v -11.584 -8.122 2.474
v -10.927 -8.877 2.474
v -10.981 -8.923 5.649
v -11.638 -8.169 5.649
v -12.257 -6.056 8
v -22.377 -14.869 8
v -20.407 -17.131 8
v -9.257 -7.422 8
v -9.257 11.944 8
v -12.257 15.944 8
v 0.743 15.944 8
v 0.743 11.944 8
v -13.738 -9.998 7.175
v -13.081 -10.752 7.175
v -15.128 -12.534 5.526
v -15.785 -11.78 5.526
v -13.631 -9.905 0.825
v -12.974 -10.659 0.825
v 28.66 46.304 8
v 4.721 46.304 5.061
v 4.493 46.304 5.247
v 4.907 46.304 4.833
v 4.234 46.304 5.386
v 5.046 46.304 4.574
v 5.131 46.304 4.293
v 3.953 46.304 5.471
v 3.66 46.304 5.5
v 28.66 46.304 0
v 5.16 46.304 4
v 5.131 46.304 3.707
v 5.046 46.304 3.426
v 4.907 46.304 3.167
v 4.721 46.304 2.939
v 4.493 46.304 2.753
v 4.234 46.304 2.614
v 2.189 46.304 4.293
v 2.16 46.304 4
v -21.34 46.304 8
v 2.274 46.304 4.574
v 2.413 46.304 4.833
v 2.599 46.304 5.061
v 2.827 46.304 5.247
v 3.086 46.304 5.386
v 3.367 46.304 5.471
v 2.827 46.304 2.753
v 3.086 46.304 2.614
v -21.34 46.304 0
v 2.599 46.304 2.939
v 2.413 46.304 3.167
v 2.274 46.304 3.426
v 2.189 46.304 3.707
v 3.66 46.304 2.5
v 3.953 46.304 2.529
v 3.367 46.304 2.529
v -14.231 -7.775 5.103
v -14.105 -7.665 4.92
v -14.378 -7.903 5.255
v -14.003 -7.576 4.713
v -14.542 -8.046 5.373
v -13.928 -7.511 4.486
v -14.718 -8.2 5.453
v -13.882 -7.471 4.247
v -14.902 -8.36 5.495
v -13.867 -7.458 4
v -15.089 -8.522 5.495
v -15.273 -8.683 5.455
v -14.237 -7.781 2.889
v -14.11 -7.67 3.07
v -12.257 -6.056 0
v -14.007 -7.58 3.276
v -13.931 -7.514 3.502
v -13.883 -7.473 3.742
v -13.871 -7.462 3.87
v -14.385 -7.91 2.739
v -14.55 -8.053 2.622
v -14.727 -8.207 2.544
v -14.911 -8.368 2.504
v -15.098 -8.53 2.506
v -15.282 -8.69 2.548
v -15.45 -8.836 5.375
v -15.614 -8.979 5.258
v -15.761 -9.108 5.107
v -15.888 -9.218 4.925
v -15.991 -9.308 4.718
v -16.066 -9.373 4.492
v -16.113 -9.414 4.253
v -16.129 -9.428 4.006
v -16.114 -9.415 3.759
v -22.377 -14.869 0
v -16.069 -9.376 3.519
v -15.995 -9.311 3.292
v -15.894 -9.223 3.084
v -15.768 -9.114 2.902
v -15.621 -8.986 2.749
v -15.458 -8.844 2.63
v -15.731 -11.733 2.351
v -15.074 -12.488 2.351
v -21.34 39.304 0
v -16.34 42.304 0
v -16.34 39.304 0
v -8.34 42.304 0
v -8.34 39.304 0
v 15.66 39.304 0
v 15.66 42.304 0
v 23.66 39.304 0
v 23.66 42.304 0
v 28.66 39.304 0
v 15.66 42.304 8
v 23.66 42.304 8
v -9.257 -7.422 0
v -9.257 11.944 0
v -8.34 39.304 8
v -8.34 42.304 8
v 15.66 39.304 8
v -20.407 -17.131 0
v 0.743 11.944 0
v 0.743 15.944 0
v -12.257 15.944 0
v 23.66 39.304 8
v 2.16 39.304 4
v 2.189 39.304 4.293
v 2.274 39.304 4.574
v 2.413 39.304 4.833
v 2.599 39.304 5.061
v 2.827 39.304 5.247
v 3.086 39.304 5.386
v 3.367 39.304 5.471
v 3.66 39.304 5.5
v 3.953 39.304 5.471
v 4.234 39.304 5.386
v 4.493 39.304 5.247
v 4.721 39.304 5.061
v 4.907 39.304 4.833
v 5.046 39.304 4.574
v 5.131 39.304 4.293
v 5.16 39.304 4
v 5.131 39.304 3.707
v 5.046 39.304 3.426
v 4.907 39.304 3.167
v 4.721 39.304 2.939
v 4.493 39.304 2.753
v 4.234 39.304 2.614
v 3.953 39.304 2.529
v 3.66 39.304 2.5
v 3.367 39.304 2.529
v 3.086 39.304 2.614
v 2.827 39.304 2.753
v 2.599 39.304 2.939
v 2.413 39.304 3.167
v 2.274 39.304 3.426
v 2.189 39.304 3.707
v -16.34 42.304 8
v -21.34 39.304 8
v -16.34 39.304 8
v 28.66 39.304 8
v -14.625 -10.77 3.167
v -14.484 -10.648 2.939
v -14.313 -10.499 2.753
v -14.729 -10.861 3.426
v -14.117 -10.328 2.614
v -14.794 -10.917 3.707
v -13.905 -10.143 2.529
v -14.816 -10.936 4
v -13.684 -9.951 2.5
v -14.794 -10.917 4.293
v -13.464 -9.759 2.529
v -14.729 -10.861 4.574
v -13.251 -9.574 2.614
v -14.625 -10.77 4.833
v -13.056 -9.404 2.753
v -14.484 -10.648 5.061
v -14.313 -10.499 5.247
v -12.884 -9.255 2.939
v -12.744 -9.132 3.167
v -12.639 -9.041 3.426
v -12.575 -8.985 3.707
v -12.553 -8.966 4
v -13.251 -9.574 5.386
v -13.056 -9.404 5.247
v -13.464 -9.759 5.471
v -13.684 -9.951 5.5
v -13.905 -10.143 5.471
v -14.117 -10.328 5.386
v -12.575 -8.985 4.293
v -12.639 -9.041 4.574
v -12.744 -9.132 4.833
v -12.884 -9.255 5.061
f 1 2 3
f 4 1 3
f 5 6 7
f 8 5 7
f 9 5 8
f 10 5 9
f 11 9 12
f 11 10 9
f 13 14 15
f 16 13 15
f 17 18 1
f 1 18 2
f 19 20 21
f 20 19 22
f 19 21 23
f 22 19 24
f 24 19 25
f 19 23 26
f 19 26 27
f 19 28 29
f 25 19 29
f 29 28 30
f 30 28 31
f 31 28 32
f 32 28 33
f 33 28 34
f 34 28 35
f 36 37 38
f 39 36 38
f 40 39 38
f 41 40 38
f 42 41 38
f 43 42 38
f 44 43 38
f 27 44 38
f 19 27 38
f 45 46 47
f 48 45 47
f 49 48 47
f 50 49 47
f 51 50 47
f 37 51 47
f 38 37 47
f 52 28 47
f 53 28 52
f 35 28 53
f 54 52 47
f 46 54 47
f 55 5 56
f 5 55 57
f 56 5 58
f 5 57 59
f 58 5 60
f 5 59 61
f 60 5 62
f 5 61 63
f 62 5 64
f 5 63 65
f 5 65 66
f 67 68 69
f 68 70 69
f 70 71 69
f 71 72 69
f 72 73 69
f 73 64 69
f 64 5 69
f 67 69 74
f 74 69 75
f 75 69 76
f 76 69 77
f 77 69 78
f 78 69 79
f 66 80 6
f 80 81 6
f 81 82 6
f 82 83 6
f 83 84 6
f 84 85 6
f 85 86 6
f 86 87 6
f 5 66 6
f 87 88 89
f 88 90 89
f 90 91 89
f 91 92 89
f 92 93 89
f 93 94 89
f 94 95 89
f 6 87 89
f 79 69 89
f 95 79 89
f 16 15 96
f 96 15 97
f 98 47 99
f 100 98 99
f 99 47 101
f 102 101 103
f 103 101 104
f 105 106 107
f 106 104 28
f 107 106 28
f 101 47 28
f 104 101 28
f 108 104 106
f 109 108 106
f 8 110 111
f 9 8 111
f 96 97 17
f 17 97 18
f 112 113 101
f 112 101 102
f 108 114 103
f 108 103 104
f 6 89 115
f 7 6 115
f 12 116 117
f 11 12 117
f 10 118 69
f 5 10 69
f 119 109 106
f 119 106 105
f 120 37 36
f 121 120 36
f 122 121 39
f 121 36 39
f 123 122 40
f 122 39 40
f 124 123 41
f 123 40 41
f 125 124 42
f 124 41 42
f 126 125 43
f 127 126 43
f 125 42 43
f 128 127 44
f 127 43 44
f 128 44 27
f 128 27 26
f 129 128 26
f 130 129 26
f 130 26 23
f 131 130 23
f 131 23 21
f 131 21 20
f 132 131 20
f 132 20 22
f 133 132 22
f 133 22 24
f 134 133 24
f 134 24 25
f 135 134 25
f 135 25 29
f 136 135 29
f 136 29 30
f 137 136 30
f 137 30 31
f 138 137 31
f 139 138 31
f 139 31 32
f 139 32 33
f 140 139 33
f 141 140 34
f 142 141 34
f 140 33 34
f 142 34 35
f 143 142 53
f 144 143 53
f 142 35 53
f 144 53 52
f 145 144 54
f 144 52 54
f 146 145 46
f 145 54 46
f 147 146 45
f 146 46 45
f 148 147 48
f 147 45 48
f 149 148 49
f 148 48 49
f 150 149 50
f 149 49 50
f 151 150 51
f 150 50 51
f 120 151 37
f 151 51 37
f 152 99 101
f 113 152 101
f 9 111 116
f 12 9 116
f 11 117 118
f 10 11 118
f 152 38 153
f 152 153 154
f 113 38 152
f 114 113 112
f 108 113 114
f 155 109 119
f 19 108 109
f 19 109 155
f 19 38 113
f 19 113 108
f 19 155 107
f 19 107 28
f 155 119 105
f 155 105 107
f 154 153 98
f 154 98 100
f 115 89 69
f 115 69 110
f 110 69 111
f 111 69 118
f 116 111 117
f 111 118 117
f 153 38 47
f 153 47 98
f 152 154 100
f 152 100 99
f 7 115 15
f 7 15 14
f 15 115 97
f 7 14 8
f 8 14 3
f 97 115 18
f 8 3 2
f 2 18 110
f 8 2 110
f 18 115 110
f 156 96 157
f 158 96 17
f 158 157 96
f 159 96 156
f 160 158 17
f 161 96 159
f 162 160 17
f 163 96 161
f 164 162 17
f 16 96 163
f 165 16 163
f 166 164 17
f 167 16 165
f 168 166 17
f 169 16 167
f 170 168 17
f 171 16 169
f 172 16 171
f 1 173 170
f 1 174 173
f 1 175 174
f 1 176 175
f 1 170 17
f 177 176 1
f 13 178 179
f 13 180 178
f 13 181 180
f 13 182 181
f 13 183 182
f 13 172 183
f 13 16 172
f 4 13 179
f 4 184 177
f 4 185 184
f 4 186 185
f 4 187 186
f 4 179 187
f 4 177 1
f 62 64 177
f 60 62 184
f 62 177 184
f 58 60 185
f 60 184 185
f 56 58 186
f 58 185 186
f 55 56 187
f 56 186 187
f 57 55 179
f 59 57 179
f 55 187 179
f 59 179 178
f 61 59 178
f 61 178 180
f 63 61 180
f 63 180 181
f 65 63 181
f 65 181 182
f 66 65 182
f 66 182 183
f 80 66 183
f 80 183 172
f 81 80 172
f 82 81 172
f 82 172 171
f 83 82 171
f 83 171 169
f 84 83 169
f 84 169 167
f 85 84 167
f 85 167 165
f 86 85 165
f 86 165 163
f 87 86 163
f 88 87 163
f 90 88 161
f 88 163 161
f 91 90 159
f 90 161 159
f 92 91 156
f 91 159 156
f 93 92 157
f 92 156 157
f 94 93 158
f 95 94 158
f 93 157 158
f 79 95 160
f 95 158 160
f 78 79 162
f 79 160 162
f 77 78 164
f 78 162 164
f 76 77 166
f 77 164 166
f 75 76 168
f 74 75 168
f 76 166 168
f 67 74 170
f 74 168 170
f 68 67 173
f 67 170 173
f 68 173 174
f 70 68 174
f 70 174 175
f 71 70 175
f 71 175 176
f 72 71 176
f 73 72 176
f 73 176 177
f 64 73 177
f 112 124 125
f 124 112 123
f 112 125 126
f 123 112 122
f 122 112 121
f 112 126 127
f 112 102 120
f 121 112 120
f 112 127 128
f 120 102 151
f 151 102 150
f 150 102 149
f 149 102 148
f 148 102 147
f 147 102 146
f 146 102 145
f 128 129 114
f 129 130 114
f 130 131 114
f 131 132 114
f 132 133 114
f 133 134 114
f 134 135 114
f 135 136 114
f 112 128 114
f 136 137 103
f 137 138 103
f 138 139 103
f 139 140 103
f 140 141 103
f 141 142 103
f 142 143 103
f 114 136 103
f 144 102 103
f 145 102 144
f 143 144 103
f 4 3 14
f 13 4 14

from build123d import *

# Parameters (mm, degrees)
F1_DEPTH = 8
F2_R     = 1.5
F3_DEPTH = 25
F4_DEPTH = 1
F6_DEPTH = 8
F7_R     = 1.5
F8_DEPTH = 25


with BuildPart() as f1:
    # F0 (on Top) → F1 (new body)
    with BuildSketch(Plane.XY):
        Polygon((0.743057, 11.943754), (0.743057, 15.943754), (-12.256943, 15.943754), (-12.256943, -6.056246), (-22.377042, -14.868752), (-20.406925, -17.131193), (-9.256943, -7.421873), (-9.256943, 11.943754), align=None)
    extrude(amount=F1_DEPTH)

    # F2 (on face) → F3 (cut)
    with BuildSketch(Plane(origin=(-0.316468, 0.363425, 0), x_dir=(0.754147, 0.656706, 0), z_dir=(0.656706, -0.754147, 0))):
        with Locations((-16.855082, 4)):
            Circle(F2_R)
    extrude(amount=-F3_DEPTH, mode=Mode.SUBTRACT)

    # F2 (on face) → F4 (cut)
    with BuildSketch(Plane(origin=(-0.316468, 0.363425, 0), x_dir=(0.754147, 0.656706, 0), z_dir=(0.656706, -0.754147, 0))):
        Polygon((-14.141328, 5.648901), (-16.926195, 7.17463), (-19.639949, 5.525729), (-19.568835, 2.351099), (-16.783968, 0.82537), (-14.070214, 2.474271), align=None)
        with Locations((-16.855082, 4)):
            Circle(F2_R, mode=Mode.SUBTRACT)
    extrude(amount=-F4_DEPTH, mode=Mode.SUBTRACT)


with BuildPart() as f6:
    # F5 (on Top) → F6 (new body)
    with BuildSketch(Plane.XY):
        Polygon((28.659979, 46.304398), (-21.340021, 46.304398), (-21.340021, 39.304398), (-16.340021, 39.304398), (-16.340021, 42.304398), (-8.340021, 42.304398), (-8.340021, 39.304398), (15.659979, 39.304398), (15.659979, 42.304398), (23.659979, 42.304398), (23.659979, 39.304398), (28.659979, 39.304398), align=None)
    extrude(amount=F6_DEPTH)

    # F7 (on face) → F8 (cut)
    with BuildSketch(Plane(origin=(0, 46.304398, 0), x_dir=(-1, 0, 0), z_dir=(0, 1, 0))):
        with Locations((-3.659979, 4)):
            Circle(F7_R)
    extrude(amount=-F8_DEPTH, mode=Mode.SUBTRACT)


solid = Compound([f1.part, f6.part])
